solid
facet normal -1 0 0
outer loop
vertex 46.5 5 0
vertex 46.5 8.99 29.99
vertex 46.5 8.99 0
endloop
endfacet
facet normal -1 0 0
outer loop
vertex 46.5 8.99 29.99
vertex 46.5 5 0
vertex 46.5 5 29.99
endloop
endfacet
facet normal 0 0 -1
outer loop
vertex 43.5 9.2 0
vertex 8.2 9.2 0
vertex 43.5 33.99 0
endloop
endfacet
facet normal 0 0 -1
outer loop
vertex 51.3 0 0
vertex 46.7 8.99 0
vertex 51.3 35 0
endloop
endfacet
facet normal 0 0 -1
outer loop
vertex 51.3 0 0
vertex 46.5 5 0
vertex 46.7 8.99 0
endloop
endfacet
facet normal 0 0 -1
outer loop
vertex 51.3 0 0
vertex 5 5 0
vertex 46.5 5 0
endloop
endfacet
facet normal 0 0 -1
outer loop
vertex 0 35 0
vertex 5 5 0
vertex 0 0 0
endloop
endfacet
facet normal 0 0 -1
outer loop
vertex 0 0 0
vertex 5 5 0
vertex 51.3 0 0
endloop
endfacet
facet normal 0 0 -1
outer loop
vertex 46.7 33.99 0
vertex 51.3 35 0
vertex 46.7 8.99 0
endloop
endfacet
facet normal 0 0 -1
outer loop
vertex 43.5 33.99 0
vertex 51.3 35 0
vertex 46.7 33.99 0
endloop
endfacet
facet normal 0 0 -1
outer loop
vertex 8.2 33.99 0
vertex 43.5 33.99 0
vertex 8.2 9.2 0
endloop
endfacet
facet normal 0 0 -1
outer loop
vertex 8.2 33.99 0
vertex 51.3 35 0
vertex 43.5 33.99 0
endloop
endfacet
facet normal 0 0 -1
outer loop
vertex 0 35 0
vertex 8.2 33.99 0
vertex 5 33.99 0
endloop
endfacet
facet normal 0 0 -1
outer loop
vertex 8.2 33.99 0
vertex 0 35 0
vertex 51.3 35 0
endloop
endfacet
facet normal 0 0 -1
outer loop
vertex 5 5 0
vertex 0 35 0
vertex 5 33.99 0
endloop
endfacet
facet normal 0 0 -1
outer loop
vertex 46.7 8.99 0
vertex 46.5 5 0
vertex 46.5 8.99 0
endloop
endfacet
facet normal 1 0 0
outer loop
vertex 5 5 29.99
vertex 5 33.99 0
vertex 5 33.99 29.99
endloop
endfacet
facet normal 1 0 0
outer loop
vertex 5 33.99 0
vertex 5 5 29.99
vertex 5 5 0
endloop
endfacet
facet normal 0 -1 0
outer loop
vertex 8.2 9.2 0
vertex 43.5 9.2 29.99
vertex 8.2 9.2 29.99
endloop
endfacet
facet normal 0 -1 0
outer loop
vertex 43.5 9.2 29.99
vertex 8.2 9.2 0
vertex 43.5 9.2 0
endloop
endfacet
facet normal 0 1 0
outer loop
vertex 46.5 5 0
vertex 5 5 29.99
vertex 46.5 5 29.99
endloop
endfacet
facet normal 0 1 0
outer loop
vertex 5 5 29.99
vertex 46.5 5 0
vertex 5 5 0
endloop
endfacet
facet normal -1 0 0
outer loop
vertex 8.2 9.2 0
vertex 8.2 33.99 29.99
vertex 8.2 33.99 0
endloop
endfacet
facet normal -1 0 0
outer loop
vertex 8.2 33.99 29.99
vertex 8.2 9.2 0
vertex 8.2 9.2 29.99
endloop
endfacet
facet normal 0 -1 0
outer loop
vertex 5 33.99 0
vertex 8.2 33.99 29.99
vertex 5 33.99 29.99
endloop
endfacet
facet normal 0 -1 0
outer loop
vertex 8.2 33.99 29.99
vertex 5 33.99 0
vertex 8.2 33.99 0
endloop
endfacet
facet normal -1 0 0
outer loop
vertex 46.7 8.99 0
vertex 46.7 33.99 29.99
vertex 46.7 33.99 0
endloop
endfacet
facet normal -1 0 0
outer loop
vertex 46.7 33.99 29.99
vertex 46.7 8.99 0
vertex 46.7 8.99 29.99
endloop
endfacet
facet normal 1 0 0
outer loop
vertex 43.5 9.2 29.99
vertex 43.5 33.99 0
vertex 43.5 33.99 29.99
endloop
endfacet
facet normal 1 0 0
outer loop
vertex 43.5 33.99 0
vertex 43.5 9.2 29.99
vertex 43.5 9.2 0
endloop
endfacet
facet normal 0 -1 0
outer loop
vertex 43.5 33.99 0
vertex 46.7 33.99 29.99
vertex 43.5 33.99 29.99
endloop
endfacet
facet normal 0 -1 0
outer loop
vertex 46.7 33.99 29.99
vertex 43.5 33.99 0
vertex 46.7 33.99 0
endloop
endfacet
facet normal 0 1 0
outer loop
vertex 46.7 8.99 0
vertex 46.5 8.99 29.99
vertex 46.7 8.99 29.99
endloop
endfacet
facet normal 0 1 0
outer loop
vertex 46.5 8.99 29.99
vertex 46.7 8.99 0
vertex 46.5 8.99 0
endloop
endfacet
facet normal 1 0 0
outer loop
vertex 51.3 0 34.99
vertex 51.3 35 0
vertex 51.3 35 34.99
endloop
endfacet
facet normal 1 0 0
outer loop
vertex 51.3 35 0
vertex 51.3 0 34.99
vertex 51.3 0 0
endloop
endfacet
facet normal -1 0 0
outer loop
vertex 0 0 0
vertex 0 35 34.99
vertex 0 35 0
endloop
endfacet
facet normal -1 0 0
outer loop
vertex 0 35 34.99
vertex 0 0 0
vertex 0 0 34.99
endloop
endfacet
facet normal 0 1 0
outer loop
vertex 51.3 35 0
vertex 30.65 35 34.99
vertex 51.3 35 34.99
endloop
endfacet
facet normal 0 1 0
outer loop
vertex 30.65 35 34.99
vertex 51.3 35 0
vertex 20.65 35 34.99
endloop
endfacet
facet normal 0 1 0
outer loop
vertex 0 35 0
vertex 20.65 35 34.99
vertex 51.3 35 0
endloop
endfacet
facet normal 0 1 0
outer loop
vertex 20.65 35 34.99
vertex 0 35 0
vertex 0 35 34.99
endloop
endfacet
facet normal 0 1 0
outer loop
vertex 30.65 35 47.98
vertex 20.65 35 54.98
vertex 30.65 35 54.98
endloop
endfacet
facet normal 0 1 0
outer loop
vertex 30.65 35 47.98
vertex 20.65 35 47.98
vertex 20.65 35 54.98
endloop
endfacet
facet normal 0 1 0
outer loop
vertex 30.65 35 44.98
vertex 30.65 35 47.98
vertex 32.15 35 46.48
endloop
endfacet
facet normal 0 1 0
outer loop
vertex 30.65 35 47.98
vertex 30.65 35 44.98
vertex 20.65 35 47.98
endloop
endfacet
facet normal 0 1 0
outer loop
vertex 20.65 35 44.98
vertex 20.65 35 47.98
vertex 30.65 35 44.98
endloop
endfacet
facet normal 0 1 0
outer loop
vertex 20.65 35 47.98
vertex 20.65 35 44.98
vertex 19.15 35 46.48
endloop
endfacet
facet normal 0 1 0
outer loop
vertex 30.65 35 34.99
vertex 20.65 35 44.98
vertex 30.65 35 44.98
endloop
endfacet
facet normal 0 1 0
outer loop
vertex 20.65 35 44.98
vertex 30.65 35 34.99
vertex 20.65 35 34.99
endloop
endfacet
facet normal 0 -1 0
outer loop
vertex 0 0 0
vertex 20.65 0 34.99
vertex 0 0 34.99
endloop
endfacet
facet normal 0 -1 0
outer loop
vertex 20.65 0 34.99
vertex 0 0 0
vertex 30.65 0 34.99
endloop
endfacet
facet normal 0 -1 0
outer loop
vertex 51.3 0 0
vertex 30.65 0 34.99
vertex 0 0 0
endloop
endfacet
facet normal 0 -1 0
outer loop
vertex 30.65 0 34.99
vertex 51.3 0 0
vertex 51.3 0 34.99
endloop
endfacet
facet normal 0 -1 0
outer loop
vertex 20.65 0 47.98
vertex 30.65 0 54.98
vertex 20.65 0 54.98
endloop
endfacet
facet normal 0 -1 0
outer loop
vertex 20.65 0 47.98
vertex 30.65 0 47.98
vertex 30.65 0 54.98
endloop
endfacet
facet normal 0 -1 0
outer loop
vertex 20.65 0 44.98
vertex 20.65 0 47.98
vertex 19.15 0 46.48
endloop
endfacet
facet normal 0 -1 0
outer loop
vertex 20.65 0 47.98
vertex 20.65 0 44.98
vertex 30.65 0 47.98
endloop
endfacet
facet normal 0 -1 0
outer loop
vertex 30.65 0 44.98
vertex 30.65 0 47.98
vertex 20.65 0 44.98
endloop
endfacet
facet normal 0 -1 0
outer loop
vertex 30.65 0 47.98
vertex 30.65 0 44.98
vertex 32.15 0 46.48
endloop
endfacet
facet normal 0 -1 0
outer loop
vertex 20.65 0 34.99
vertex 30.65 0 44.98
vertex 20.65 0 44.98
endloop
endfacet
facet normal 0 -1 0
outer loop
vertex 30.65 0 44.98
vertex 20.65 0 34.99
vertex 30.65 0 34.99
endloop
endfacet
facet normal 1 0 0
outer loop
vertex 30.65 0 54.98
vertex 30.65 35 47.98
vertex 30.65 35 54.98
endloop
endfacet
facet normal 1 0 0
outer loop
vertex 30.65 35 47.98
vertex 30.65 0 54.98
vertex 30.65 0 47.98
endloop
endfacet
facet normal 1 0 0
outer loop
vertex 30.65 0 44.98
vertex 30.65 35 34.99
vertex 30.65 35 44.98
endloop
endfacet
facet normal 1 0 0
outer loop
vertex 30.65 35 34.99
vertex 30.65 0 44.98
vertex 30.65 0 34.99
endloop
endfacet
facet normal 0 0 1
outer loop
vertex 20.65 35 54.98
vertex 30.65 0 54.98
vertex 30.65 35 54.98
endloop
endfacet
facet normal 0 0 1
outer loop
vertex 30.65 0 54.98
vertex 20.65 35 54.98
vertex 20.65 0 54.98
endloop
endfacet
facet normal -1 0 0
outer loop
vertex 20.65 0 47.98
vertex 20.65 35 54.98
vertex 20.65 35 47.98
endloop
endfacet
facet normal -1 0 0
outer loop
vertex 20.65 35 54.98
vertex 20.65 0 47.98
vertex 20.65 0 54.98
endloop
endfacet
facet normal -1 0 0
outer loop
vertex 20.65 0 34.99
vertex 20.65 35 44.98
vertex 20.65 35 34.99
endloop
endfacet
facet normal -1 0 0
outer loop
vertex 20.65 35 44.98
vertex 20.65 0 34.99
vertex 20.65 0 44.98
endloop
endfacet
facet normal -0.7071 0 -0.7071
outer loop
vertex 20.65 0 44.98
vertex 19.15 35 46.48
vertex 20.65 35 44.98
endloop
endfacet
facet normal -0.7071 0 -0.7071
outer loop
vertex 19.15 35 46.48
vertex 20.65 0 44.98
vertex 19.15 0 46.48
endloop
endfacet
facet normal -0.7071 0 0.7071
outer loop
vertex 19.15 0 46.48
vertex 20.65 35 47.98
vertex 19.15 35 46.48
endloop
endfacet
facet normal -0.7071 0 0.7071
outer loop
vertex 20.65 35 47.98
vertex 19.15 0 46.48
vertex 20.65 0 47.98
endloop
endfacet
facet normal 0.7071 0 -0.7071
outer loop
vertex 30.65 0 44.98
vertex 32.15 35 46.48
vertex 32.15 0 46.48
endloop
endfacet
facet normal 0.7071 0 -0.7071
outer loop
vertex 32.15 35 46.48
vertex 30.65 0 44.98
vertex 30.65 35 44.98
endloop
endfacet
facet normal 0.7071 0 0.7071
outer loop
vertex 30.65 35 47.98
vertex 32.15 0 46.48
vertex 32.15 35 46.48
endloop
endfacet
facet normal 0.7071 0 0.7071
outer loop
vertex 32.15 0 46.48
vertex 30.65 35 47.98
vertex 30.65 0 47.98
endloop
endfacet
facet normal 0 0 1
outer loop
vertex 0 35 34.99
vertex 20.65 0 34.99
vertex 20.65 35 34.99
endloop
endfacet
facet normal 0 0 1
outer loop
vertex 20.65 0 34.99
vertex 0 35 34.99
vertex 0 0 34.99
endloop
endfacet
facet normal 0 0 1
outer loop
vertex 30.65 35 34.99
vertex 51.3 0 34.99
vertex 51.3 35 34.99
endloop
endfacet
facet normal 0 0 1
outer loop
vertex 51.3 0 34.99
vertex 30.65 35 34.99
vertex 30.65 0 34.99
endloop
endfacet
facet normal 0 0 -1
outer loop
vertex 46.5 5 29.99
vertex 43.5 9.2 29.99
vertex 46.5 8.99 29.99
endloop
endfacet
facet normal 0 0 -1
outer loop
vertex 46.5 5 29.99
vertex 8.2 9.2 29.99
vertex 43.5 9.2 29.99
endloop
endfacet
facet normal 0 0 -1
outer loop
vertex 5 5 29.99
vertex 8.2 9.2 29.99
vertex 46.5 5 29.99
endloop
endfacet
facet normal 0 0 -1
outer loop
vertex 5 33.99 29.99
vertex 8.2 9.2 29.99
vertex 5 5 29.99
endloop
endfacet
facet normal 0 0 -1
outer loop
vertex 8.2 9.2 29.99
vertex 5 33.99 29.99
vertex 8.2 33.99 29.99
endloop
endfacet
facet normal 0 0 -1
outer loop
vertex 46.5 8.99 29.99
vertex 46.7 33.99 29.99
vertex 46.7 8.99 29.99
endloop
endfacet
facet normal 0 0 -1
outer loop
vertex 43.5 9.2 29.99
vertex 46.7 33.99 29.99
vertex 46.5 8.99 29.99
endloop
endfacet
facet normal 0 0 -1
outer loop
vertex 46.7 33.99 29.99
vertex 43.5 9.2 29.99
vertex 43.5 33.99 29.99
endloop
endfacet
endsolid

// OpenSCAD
side_hole_thickness = 3;
back_hole_thickness = 4;

hole_inside_width = 35;
hole_outside_width = 41.3;

hole_depth = 25;
top_depth = 5;

wall_thickness = 5;

height = 30; // Increase for stability
extra = 0.1;
fudge = 0.01;

external_box_x = hole_outside_width + wall_thickness*2;
external_box_y = hole_depth + wall_thickness*2;
external_box_z = height;

lip_x = 10;
lip_z = 20;

ridge_x = 1.5;
ridge_side = ridge_x/sin(45);

difference() {
    // Main cube
    cube([external_box_x, external_box_y, external_box_z]);

    // Channel to cut for mounting
    translate([wall_thickness, wall_thickness, 0]) {
        // back hole
        cube([hole_outside_width + extra*2, back_hole_thickness + extra * 2, height]);

        // Side channel
        translate([0, back_hole_thickness - fudge, 0])
        cube([side_hole_thickness + extra * 2, hole_depth, height]);

        // Other side channel
        translate([hole_outside_width + extra*2 - side_hole_thickness, back_hole_thickness - fudge, 0])
        cube([side_hole_thickness + extra*2, hole_depth, height]);
    }
}

// Top of the cube
translate([0, 0, height - fudge])
cube([hole_outside_width + wall_thickness*2, hole_depth + wall_thickness*2, top_depth]);

module ridge() {
    translate([0, external_box_y/2, ridge_x])
    rotate([0, 45, 0])
    cube([ridge_side, external_box_y, ridge_side], center=true);
}

// Top part to clip on
translate([external_box_x/2 - lip_x/2, 0, height + top_depth - fudge*2]) {
    cube([lip_x, external_box_y, lip_z]);
    
    translate([0, 0, lip_z/2])
        ridge();
        
    translate([lip_x, 0, lip_z/2])
        ridge();
}
